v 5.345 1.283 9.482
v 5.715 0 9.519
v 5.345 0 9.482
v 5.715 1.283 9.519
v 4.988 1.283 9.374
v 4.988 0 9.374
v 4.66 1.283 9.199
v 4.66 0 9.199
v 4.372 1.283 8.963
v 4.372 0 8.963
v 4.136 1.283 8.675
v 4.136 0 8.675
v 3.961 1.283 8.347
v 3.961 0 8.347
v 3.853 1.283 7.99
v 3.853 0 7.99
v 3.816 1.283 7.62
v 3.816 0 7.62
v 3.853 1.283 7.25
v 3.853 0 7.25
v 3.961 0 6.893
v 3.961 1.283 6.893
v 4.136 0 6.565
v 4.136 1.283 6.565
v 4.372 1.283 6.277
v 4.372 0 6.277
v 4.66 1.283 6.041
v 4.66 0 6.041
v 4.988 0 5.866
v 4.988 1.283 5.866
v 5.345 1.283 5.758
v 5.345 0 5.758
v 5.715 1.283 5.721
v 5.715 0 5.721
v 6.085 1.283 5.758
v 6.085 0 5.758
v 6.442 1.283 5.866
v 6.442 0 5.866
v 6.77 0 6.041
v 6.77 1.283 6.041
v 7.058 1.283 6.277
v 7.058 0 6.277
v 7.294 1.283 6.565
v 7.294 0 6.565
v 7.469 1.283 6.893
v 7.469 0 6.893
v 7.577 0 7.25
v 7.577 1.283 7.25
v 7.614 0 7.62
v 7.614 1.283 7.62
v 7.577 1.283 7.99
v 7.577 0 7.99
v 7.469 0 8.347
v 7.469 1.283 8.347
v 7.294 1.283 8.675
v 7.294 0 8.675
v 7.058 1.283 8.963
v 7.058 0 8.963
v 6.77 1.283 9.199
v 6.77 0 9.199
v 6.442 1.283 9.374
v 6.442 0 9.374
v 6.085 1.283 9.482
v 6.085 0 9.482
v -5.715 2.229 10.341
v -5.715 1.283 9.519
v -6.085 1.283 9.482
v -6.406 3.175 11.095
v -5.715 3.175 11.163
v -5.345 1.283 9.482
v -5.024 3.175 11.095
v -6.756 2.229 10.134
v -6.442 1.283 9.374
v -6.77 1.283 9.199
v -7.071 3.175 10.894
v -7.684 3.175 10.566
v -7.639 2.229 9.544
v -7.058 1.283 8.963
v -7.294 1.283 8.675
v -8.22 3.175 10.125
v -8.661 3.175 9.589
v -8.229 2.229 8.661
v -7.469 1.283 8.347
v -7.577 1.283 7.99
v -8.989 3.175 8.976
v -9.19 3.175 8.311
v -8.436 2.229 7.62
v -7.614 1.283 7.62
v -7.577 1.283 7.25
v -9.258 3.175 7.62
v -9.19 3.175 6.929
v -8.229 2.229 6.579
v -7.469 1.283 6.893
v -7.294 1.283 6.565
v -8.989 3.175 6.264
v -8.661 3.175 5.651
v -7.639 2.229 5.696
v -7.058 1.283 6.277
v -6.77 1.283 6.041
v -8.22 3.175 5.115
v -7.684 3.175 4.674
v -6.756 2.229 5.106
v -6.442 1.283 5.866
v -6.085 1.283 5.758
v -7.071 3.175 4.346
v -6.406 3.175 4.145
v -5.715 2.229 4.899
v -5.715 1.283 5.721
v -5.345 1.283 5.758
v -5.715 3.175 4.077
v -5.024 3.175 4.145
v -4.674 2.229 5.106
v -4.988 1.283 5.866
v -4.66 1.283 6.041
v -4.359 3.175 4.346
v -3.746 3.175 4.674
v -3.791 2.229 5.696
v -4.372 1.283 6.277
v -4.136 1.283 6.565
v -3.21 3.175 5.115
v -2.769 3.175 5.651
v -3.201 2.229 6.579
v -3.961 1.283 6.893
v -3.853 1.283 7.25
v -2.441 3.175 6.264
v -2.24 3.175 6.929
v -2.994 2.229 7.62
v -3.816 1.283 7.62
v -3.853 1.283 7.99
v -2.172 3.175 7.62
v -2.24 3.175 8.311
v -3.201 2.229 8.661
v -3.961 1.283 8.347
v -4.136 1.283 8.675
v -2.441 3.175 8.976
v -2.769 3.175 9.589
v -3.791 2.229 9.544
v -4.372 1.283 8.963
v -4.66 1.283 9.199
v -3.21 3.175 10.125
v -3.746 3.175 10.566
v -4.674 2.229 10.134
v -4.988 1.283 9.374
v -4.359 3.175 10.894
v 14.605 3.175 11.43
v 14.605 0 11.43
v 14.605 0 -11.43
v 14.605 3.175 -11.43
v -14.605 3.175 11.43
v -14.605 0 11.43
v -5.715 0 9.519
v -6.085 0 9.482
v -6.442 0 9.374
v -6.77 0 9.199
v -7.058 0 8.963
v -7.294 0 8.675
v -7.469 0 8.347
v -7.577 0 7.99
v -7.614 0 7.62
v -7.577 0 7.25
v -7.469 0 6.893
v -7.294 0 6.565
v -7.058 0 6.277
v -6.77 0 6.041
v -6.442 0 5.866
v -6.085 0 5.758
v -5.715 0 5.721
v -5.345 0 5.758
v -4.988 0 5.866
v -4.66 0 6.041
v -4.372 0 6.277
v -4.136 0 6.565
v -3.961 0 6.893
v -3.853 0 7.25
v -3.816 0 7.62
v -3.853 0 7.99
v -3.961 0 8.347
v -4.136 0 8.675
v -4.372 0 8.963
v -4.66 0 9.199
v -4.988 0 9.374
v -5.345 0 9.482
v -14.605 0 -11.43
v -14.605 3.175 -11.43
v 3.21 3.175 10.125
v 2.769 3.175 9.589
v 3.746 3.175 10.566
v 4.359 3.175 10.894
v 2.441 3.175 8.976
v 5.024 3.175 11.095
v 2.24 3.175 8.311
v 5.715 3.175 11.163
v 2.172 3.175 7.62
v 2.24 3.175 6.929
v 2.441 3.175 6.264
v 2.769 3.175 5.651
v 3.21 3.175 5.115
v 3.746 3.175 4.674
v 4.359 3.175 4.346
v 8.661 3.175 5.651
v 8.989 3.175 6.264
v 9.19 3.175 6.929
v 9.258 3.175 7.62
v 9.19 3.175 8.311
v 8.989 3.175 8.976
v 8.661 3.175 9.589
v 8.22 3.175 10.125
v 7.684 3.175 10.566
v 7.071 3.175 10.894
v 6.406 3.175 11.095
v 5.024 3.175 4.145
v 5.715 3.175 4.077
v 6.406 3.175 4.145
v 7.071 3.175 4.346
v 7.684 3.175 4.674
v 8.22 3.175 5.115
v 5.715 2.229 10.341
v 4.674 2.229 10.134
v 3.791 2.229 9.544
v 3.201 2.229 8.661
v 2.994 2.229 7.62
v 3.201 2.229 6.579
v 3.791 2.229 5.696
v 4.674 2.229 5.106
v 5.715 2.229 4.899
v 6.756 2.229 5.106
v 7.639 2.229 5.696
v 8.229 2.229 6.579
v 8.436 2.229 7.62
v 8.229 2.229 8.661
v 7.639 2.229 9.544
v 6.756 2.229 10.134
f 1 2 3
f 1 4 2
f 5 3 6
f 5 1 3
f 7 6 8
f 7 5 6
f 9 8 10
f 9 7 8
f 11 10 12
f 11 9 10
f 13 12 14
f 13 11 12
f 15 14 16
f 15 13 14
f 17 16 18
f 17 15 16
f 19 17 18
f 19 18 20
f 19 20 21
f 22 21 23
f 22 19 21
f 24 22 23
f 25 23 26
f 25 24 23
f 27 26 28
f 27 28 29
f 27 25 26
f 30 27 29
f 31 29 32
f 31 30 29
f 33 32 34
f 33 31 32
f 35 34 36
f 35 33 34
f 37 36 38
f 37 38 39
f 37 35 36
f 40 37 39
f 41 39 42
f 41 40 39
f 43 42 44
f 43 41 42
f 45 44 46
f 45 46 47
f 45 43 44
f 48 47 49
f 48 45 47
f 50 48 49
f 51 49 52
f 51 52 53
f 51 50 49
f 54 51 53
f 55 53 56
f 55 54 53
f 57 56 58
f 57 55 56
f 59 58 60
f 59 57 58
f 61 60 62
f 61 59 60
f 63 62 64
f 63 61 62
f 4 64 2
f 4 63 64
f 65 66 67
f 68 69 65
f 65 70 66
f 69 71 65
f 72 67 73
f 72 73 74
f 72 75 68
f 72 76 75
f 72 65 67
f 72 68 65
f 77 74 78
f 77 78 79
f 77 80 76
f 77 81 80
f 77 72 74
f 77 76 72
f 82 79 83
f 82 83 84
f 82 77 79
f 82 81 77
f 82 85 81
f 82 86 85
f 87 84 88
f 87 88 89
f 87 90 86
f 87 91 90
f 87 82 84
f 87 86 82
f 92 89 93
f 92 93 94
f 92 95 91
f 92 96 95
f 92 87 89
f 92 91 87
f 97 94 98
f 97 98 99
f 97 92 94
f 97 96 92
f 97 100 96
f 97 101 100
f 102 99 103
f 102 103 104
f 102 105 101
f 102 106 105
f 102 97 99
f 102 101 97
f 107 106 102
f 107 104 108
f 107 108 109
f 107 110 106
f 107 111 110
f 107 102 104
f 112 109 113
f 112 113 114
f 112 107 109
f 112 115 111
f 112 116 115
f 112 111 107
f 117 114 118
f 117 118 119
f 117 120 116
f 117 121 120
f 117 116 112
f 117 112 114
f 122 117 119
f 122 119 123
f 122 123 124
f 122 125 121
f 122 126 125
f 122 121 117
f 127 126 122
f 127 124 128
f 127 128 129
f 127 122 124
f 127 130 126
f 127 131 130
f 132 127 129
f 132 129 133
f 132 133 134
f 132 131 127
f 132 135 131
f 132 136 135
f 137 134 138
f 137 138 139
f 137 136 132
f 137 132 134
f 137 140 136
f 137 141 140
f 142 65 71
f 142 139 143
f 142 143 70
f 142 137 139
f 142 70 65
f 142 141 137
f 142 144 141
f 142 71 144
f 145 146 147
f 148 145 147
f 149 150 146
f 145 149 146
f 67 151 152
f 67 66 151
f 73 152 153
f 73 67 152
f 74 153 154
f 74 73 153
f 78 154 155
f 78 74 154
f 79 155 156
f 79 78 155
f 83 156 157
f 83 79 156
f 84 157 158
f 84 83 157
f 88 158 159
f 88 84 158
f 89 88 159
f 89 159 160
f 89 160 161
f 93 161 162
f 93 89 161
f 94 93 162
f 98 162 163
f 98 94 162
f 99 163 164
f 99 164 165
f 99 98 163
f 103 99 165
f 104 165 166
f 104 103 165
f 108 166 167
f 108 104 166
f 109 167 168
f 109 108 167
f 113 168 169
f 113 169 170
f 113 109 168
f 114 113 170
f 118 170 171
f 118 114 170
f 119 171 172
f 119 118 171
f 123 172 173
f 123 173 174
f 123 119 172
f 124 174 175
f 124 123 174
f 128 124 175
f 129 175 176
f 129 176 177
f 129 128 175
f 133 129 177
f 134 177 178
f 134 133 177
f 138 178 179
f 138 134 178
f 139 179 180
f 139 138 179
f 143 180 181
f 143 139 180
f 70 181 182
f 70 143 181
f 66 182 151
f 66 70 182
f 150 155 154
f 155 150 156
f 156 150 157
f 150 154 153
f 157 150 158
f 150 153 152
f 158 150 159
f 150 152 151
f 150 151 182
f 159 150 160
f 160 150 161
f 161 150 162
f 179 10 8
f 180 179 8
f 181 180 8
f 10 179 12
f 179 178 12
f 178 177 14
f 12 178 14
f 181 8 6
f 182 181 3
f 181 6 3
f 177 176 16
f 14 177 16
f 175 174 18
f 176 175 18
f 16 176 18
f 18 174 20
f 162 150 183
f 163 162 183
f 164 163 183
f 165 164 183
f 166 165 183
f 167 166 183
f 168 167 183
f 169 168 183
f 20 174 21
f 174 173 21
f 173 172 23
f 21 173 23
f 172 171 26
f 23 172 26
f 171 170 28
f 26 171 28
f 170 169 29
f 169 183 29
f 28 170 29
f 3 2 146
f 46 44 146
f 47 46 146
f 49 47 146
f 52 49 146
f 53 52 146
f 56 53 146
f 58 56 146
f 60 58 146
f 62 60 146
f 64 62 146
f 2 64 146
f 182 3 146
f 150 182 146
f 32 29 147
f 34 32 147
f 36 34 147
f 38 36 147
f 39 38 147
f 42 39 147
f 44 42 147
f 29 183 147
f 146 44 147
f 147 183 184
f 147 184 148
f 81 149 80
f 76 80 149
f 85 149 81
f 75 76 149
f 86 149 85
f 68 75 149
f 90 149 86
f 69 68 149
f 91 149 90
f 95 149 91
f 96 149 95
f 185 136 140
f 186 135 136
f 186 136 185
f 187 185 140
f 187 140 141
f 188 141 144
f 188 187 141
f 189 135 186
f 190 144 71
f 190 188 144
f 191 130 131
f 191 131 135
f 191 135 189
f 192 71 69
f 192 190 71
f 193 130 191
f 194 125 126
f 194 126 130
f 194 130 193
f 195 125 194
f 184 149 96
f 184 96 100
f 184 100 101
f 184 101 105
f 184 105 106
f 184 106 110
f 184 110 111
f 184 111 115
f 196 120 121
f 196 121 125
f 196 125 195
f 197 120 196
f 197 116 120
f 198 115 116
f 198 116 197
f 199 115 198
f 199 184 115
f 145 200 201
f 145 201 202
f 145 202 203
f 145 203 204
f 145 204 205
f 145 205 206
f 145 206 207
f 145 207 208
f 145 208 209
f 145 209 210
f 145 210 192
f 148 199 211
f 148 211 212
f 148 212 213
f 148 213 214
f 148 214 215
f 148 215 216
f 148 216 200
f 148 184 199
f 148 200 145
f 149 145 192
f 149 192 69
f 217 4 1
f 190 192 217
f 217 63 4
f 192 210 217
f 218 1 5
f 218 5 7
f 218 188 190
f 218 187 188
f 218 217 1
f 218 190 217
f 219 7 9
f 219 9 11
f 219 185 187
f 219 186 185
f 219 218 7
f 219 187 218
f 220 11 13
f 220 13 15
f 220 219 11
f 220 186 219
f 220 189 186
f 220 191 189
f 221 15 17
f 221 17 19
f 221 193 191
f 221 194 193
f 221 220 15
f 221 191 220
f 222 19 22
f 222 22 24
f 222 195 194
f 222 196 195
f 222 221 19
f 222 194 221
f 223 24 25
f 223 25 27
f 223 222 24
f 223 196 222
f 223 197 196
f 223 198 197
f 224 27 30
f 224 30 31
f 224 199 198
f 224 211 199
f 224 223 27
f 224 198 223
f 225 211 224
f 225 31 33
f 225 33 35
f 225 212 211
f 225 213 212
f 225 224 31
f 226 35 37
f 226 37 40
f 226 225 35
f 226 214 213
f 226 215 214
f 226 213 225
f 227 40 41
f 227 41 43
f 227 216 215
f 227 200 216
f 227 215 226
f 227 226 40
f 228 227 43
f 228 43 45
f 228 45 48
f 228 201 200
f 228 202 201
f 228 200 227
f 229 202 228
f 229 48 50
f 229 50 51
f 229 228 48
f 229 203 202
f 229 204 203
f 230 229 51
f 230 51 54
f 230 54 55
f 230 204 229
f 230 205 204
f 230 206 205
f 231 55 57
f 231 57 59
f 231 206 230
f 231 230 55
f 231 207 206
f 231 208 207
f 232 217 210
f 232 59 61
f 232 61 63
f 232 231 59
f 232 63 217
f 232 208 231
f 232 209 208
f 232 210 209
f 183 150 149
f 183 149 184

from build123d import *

# Parameters (mm, degrees)
SKETCH1_W                                     = 29.21
SKETCH1_H                                     = 22.86
BOSS_EXTRUDE1_DEPTH                           = 3.175
CSK_FOR_6_FLAT_HEAD_MACHINE_SCREW1_AT_2_COUNT = 2
CSK_FOR_6_FLAT_HEAD_MACHINE_SCREW1_AT_2_PITCH = 11.43


with BuildPart() as part:
    # Sketch1 → Boss-Extrude1 (new body)
    with BuildSketch(Plane(origin=(0, 0, 0), x_dir=(1, 0, 0), z_dir=(0, 1, 0))):
        Rectangle(SKETCH1_W, SKETCH1_H)
    extrude(amount=BOSS_EXTRUDE1_DEPTH)

    # Sketch5 → CSK for #6 Flat Head Machine Screw1 (revolve, cut)
    with BuildSketch(Plane(origin=(-5.715, 3.175, 7.62), x_dir=(0, 0, 1), z_dir=(1, 0, 0))):
        Polygon((0, 0), (0, 3.175), (1.89865, 3.175), (1.89865, 1.891953401), (3.5433, 0), align=None)
    csk_for_6_flat_head_machine_screw1 = revolve(axis=Axis((-5.715, 9.525, 7.62), (0, -1, 0)), mode=Mode.SUBTRACT)

    # CSK for #6 Flat Head Machine Screw1 at 2: CSK for #6 Flat Head Machine Screw1 ×2
    with Locations(*[(i * CSK_FOR_6_FLAT_HEAD_MACHINE_SCREW1_AT_2_PITCH, 0, 0) for i in range(1, CSK_FOR_6_FLAT_HEAD_MACHINE_SCREW1_AT_2_COUNT)]):
        add(csk_for_6_flat_head_machine_screw1, mode=Mode.SUBTRACT)


solid = part.part
